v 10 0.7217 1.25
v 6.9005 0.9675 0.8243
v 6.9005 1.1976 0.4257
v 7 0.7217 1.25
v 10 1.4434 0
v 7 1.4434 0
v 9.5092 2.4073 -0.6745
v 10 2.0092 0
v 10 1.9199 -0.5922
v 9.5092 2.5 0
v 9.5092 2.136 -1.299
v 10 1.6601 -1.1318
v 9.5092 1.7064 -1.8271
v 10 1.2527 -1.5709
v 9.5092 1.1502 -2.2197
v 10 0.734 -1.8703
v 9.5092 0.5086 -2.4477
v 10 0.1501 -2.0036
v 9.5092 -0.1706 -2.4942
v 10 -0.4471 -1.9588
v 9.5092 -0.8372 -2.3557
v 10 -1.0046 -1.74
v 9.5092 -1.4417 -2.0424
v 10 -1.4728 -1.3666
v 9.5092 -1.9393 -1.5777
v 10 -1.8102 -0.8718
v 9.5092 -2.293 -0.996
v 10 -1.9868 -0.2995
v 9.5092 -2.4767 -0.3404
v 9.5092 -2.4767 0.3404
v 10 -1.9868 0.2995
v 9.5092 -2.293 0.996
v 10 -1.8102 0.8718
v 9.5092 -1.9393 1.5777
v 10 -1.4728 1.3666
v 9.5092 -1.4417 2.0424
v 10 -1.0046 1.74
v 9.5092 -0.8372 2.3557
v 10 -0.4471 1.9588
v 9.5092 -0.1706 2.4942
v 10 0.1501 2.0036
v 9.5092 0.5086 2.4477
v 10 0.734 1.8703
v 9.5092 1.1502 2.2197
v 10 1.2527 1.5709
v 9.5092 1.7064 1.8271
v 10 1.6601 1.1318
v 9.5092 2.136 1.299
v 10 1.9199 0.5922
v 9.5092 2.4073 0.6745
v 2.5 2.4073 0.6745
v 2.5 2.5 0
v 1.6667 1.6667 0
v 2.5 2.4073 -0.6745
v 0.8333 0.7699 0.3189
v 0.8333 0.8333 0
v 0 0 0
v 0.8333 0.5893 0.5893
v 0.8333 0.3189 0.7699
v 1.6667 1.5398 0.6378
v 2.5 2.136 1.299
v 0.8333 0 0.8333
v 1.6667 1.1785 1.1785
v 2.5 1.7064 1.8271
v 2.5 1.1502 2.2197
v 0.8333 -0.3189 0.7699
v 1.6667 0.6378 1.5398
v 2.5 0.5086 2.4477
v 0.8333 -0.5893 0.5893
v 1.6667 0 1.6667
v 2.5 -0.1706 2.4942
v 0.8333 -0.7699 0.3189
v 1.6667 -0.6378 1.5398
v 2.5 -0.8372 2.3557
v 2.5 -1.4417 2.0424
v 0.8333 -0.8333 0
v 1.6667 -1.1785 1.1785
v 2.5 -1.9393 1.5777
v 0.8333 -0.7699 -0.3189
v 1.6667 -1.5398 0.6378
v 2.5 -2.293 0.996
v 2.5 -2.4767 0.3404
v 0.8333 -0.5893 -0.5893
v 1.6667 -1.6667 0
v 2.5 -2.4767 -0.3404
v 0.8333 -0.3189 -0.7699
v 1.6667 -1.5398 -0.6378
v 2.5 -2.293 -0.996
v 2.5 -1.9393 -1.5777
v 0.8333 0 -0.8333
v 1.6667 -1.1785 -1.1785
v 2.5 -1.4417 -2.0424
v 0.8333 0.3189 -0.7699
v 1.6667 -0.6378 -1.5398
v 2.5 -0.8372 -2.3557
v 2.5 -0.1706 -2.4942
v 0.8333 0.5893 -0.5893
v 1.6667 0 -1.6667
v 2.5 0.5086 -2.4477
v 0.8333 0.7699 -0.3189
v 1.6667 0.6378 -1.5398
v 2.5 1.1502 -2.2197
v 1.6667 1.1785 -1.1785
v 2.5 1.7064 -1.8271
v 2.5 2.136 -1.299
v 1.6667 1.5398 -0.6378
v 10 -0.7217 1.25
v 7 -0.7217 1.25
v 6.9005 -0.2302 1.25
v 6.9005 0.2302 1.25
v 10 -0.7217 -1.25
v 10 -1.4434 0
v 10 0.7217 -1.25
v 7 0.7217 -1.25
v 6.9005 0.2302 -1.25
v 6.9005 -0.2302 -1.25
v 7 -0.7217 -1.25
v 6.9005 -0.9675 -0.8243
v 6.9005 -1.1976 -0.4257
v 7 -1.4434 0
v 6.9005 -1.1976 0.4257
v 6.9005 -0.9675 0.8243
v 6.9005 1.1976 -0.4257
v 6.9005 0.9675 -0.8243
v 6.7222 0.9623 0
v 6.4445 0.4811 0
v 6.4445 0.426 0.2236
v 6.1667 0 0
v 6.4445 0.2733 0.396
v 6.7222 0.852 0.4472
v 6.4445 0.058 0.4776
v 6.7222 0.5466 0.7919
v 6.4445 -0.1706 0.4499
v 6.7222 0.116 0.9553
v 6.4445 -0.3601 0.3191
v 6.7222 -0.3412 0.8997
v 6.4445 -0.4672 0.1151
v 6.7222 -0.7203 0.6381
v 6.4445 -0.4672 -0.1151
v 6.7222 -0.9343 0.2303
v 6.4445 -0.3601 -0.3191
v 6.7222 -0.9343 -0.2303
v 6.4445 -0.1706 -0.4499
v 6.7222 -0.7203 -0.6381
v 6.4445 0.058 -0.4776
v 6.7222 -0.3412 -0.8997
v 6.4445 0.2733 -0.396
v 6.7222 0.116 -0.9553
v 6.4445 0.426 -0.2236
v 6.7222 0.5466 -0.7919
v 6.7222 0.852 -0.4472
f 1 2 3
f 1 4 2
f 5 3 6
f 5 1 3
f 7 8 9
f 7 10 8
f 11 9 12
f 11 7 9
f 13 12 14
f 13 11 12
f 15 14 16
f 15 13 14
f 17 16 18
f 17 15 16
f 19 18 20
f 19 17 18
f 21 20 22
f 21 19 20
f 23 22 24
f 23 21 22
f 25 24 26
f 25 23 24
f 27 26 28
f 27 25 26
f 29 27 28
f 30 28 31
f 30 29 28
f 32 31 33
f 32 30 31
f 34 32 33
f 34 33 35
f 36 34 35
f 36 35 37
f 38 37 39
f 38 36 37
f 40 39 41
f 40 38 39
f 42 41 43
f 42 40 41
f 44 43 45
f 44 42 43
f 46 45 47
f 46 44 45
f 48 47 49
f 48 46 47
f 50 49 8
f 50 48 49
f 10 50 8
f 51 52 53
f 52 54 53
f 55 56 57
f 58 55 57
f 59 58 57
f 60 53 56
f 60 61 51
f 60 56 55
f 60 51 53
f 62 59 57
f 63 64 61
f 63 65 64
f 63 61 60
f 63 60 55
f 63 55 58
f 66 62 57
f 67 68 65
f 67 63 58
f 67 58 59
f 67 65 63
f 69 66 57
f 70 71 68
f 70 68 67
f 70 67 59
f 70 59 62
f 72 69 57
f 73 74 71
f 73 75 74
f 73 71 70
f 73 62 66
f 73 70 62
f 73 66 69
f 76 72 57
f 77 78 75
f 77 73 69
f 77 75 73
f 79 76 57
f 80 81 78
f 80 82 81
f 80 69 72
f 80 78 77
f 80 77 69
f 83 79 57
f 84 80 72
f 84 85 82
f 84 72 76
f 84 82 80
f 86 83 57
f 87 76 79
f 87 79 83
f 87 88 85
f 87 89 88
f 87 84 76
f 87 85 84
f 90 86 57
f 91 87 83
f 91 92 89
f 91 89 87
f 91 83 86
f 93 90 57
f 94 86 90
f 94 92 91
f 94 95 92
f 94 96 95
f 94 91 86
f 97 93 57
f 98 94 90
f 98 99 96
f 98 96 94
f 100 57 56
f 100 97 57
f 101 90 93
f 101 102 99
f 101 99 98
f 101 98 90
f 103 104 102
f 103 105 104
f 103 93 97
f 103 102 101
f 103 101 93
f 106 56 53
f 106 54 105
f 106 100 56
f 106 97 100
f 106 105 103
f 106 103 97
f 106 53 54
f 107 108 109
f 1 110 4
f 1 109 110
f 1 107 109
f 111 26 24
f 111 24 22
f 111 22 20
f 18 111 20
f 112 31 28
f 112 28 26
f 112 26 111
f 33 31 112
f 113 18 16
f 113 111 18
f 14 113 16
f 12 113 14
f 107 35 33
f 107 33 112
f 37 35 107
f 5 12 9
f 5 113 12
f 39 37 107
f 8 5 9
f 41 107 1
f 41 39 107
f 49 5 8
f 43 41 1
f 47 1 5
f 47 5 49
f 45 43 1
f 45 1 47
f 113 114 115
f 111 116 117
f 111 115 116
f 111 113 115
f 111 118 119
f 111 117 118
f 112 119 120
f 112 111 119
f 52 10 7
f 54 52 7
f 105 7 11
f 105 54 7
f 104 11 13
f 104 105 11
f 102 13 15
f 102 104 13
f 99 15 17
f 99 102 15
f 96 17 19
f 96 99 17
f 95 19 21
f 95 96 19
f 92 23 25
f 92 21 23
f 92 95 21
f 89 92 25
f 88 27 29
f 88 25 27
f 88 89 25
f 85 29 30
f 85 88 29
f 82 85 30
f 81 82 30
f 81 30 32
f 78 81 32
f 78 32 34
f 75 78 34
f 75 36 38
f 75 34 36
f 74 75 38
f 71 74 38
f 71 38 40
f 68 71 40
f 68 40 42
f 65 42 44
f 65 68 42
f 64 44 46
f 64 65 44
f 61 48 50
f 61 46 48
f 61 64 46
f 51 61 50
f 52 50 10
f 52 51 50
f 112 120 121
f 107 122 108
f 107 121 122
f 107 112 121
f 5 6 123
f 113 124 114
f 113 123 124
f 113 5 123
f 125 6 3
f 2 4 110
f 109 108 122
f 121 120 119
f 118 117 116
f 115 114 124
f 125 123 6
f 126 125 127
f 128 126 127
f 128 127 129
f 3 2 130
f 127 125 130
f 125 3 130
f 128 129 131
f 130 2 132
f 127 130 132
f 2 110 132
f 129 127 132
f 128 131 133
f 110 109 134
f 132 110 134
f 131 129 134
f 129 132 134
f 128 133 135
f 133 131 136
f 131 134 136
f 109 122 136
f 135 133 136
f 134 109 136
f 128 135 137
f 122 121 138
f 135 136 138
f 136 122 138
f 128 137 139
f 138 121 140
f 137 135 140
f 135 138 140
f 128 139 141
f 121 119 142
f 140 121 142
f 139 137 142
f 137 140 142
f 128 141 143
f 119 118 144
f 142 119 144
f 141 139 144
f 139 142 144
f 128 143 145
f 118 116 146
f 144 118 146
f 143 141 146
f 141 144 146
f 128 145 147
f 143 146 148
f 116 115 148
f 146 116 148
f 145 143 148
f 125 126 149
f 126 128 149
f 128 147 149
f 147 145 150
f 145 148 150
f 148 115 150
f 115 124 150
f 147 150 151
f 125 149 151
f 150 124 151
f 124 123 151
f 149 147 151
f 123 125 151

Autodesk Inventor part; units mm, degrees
ref_plane "YZ Plane" through (0, 0, 0) normal (1, 0, 0) x (0, 1, 0)
ref_plane "XZ Plane" through (0, 0, 0) normal (0, 1, 0) x (-1, 0, 0)
sketch "Sketch1" plane through (0, 0, 0) normal (0, 0, 1) x (1, 0, 0)
  line L0 (0, 0) -> (6.1667, 0)
  line L1 (10, 1.4434) -> (10, 2.5)
  line L2 (10, 2.5) -> (0, 2.5)
  line L3 (10, 1.4434) -> (7, 1.4434)
  line L4 (7, 1.4434) -> (6.1667, 0)
  line L5 (0, -0.5) -> (0, 3) projected
  line L6 (0, 2.5) -> (0, 0)
  dimension "d0" = 3
  dimension "d1" = 60
  dimension "d2" = 5
  dimension "d3" = 2.8868
  dimension "d5" = 10
revolve "Body" add sketch "Sketch1" angle 360 about axis through (0, 0, 0) along (1, 0, 0)
sketch "Sketch2" plane through (10, 0, 0) normal (1, 0, 0) x (0, 1, 0)
  circle A0 centre (0, 0) radius 1.4434 projected
  line L0 (-0.7217, 1.25) -> (0.7217, 1.25)
  line L1 (0.7217, 1.25) -> (1.4434, 0)
  line L2 (1.4434, 0) -> (0.7217, -1.25)
  line L3 (0.7217, -1.25) -> (-0.7217, -1.25)
  line L4 (-0.7217, -1.25) -> (-1.4434, 0)
  line L5 (-1.4434, 0) -> (-0.7217, 1.25)
  point P0 (0, 0)
  point P1 (0, 0)
extrude "Slot" add sketch "Sketch2" against normal up to next contours L1 A0 | A0 L2 | L0 A0 | A0 L3 | L5 A0 | A0 L4
thread "Thread" size "M5x0.8" class "6g" standard "ISO Metric profile" length 10
chamfer "Chamfer1" distance 2.5 angle 45 1 edges at (0, -2.5, 0) measured on face at (6.6667, 2.4919, -0.2012)
chamfer "Chamfer2" distance 0.4908 angle 45 1 edges at (10, -2.5, 0) measured on face at (7.4998, 2.4676, -0.401)
ref_plane "Work Plane1" through (5, 0, 0) normal (0, 0, 1) x (1, 0, 0)
equation "\"d0\" = INTI"
equation "\"d2\" = NND"
equation "\"d3\" = 1.1547 * SW"
equation "\"d5\" = NLG"
equation "\"d12\" = NLG"
equation "\"d9\" = FAWI"
equation "\"d10\" = -0.5 * GD1 + 0.5 * NND"
equation "\"d11\" = FAWI"
equation "\"d35\" = -0.5 * GD1 + 0.5 * NND"
equation "\"NND\" = 5"
equation "\"NLG\" = 10"
equation "\"INTI\" = 3"
equation "\"FAWI\" = 45deg"
equation "\"SW\" = 2.5"
equation "\"GD1\" = THREADDIA - 1.2269 * PTC"
equation "\"FAWI1\" = 45deg"
equation "\"SPD\" = 0.00001"
equation "\"GUL\" = 0.61345 * PTC"
equation "\"TOA\" = 30deg"
equation "\"THREADDIA\" = 5"
equation "\"PTC\" = 0.8"
equation "\"GAL\" = 0.61345 * PTC"
equation "\"E0\" = 1.155 * SW"
properties part number "DIN 914 - M5 x 10" material "Steel, Mild"
